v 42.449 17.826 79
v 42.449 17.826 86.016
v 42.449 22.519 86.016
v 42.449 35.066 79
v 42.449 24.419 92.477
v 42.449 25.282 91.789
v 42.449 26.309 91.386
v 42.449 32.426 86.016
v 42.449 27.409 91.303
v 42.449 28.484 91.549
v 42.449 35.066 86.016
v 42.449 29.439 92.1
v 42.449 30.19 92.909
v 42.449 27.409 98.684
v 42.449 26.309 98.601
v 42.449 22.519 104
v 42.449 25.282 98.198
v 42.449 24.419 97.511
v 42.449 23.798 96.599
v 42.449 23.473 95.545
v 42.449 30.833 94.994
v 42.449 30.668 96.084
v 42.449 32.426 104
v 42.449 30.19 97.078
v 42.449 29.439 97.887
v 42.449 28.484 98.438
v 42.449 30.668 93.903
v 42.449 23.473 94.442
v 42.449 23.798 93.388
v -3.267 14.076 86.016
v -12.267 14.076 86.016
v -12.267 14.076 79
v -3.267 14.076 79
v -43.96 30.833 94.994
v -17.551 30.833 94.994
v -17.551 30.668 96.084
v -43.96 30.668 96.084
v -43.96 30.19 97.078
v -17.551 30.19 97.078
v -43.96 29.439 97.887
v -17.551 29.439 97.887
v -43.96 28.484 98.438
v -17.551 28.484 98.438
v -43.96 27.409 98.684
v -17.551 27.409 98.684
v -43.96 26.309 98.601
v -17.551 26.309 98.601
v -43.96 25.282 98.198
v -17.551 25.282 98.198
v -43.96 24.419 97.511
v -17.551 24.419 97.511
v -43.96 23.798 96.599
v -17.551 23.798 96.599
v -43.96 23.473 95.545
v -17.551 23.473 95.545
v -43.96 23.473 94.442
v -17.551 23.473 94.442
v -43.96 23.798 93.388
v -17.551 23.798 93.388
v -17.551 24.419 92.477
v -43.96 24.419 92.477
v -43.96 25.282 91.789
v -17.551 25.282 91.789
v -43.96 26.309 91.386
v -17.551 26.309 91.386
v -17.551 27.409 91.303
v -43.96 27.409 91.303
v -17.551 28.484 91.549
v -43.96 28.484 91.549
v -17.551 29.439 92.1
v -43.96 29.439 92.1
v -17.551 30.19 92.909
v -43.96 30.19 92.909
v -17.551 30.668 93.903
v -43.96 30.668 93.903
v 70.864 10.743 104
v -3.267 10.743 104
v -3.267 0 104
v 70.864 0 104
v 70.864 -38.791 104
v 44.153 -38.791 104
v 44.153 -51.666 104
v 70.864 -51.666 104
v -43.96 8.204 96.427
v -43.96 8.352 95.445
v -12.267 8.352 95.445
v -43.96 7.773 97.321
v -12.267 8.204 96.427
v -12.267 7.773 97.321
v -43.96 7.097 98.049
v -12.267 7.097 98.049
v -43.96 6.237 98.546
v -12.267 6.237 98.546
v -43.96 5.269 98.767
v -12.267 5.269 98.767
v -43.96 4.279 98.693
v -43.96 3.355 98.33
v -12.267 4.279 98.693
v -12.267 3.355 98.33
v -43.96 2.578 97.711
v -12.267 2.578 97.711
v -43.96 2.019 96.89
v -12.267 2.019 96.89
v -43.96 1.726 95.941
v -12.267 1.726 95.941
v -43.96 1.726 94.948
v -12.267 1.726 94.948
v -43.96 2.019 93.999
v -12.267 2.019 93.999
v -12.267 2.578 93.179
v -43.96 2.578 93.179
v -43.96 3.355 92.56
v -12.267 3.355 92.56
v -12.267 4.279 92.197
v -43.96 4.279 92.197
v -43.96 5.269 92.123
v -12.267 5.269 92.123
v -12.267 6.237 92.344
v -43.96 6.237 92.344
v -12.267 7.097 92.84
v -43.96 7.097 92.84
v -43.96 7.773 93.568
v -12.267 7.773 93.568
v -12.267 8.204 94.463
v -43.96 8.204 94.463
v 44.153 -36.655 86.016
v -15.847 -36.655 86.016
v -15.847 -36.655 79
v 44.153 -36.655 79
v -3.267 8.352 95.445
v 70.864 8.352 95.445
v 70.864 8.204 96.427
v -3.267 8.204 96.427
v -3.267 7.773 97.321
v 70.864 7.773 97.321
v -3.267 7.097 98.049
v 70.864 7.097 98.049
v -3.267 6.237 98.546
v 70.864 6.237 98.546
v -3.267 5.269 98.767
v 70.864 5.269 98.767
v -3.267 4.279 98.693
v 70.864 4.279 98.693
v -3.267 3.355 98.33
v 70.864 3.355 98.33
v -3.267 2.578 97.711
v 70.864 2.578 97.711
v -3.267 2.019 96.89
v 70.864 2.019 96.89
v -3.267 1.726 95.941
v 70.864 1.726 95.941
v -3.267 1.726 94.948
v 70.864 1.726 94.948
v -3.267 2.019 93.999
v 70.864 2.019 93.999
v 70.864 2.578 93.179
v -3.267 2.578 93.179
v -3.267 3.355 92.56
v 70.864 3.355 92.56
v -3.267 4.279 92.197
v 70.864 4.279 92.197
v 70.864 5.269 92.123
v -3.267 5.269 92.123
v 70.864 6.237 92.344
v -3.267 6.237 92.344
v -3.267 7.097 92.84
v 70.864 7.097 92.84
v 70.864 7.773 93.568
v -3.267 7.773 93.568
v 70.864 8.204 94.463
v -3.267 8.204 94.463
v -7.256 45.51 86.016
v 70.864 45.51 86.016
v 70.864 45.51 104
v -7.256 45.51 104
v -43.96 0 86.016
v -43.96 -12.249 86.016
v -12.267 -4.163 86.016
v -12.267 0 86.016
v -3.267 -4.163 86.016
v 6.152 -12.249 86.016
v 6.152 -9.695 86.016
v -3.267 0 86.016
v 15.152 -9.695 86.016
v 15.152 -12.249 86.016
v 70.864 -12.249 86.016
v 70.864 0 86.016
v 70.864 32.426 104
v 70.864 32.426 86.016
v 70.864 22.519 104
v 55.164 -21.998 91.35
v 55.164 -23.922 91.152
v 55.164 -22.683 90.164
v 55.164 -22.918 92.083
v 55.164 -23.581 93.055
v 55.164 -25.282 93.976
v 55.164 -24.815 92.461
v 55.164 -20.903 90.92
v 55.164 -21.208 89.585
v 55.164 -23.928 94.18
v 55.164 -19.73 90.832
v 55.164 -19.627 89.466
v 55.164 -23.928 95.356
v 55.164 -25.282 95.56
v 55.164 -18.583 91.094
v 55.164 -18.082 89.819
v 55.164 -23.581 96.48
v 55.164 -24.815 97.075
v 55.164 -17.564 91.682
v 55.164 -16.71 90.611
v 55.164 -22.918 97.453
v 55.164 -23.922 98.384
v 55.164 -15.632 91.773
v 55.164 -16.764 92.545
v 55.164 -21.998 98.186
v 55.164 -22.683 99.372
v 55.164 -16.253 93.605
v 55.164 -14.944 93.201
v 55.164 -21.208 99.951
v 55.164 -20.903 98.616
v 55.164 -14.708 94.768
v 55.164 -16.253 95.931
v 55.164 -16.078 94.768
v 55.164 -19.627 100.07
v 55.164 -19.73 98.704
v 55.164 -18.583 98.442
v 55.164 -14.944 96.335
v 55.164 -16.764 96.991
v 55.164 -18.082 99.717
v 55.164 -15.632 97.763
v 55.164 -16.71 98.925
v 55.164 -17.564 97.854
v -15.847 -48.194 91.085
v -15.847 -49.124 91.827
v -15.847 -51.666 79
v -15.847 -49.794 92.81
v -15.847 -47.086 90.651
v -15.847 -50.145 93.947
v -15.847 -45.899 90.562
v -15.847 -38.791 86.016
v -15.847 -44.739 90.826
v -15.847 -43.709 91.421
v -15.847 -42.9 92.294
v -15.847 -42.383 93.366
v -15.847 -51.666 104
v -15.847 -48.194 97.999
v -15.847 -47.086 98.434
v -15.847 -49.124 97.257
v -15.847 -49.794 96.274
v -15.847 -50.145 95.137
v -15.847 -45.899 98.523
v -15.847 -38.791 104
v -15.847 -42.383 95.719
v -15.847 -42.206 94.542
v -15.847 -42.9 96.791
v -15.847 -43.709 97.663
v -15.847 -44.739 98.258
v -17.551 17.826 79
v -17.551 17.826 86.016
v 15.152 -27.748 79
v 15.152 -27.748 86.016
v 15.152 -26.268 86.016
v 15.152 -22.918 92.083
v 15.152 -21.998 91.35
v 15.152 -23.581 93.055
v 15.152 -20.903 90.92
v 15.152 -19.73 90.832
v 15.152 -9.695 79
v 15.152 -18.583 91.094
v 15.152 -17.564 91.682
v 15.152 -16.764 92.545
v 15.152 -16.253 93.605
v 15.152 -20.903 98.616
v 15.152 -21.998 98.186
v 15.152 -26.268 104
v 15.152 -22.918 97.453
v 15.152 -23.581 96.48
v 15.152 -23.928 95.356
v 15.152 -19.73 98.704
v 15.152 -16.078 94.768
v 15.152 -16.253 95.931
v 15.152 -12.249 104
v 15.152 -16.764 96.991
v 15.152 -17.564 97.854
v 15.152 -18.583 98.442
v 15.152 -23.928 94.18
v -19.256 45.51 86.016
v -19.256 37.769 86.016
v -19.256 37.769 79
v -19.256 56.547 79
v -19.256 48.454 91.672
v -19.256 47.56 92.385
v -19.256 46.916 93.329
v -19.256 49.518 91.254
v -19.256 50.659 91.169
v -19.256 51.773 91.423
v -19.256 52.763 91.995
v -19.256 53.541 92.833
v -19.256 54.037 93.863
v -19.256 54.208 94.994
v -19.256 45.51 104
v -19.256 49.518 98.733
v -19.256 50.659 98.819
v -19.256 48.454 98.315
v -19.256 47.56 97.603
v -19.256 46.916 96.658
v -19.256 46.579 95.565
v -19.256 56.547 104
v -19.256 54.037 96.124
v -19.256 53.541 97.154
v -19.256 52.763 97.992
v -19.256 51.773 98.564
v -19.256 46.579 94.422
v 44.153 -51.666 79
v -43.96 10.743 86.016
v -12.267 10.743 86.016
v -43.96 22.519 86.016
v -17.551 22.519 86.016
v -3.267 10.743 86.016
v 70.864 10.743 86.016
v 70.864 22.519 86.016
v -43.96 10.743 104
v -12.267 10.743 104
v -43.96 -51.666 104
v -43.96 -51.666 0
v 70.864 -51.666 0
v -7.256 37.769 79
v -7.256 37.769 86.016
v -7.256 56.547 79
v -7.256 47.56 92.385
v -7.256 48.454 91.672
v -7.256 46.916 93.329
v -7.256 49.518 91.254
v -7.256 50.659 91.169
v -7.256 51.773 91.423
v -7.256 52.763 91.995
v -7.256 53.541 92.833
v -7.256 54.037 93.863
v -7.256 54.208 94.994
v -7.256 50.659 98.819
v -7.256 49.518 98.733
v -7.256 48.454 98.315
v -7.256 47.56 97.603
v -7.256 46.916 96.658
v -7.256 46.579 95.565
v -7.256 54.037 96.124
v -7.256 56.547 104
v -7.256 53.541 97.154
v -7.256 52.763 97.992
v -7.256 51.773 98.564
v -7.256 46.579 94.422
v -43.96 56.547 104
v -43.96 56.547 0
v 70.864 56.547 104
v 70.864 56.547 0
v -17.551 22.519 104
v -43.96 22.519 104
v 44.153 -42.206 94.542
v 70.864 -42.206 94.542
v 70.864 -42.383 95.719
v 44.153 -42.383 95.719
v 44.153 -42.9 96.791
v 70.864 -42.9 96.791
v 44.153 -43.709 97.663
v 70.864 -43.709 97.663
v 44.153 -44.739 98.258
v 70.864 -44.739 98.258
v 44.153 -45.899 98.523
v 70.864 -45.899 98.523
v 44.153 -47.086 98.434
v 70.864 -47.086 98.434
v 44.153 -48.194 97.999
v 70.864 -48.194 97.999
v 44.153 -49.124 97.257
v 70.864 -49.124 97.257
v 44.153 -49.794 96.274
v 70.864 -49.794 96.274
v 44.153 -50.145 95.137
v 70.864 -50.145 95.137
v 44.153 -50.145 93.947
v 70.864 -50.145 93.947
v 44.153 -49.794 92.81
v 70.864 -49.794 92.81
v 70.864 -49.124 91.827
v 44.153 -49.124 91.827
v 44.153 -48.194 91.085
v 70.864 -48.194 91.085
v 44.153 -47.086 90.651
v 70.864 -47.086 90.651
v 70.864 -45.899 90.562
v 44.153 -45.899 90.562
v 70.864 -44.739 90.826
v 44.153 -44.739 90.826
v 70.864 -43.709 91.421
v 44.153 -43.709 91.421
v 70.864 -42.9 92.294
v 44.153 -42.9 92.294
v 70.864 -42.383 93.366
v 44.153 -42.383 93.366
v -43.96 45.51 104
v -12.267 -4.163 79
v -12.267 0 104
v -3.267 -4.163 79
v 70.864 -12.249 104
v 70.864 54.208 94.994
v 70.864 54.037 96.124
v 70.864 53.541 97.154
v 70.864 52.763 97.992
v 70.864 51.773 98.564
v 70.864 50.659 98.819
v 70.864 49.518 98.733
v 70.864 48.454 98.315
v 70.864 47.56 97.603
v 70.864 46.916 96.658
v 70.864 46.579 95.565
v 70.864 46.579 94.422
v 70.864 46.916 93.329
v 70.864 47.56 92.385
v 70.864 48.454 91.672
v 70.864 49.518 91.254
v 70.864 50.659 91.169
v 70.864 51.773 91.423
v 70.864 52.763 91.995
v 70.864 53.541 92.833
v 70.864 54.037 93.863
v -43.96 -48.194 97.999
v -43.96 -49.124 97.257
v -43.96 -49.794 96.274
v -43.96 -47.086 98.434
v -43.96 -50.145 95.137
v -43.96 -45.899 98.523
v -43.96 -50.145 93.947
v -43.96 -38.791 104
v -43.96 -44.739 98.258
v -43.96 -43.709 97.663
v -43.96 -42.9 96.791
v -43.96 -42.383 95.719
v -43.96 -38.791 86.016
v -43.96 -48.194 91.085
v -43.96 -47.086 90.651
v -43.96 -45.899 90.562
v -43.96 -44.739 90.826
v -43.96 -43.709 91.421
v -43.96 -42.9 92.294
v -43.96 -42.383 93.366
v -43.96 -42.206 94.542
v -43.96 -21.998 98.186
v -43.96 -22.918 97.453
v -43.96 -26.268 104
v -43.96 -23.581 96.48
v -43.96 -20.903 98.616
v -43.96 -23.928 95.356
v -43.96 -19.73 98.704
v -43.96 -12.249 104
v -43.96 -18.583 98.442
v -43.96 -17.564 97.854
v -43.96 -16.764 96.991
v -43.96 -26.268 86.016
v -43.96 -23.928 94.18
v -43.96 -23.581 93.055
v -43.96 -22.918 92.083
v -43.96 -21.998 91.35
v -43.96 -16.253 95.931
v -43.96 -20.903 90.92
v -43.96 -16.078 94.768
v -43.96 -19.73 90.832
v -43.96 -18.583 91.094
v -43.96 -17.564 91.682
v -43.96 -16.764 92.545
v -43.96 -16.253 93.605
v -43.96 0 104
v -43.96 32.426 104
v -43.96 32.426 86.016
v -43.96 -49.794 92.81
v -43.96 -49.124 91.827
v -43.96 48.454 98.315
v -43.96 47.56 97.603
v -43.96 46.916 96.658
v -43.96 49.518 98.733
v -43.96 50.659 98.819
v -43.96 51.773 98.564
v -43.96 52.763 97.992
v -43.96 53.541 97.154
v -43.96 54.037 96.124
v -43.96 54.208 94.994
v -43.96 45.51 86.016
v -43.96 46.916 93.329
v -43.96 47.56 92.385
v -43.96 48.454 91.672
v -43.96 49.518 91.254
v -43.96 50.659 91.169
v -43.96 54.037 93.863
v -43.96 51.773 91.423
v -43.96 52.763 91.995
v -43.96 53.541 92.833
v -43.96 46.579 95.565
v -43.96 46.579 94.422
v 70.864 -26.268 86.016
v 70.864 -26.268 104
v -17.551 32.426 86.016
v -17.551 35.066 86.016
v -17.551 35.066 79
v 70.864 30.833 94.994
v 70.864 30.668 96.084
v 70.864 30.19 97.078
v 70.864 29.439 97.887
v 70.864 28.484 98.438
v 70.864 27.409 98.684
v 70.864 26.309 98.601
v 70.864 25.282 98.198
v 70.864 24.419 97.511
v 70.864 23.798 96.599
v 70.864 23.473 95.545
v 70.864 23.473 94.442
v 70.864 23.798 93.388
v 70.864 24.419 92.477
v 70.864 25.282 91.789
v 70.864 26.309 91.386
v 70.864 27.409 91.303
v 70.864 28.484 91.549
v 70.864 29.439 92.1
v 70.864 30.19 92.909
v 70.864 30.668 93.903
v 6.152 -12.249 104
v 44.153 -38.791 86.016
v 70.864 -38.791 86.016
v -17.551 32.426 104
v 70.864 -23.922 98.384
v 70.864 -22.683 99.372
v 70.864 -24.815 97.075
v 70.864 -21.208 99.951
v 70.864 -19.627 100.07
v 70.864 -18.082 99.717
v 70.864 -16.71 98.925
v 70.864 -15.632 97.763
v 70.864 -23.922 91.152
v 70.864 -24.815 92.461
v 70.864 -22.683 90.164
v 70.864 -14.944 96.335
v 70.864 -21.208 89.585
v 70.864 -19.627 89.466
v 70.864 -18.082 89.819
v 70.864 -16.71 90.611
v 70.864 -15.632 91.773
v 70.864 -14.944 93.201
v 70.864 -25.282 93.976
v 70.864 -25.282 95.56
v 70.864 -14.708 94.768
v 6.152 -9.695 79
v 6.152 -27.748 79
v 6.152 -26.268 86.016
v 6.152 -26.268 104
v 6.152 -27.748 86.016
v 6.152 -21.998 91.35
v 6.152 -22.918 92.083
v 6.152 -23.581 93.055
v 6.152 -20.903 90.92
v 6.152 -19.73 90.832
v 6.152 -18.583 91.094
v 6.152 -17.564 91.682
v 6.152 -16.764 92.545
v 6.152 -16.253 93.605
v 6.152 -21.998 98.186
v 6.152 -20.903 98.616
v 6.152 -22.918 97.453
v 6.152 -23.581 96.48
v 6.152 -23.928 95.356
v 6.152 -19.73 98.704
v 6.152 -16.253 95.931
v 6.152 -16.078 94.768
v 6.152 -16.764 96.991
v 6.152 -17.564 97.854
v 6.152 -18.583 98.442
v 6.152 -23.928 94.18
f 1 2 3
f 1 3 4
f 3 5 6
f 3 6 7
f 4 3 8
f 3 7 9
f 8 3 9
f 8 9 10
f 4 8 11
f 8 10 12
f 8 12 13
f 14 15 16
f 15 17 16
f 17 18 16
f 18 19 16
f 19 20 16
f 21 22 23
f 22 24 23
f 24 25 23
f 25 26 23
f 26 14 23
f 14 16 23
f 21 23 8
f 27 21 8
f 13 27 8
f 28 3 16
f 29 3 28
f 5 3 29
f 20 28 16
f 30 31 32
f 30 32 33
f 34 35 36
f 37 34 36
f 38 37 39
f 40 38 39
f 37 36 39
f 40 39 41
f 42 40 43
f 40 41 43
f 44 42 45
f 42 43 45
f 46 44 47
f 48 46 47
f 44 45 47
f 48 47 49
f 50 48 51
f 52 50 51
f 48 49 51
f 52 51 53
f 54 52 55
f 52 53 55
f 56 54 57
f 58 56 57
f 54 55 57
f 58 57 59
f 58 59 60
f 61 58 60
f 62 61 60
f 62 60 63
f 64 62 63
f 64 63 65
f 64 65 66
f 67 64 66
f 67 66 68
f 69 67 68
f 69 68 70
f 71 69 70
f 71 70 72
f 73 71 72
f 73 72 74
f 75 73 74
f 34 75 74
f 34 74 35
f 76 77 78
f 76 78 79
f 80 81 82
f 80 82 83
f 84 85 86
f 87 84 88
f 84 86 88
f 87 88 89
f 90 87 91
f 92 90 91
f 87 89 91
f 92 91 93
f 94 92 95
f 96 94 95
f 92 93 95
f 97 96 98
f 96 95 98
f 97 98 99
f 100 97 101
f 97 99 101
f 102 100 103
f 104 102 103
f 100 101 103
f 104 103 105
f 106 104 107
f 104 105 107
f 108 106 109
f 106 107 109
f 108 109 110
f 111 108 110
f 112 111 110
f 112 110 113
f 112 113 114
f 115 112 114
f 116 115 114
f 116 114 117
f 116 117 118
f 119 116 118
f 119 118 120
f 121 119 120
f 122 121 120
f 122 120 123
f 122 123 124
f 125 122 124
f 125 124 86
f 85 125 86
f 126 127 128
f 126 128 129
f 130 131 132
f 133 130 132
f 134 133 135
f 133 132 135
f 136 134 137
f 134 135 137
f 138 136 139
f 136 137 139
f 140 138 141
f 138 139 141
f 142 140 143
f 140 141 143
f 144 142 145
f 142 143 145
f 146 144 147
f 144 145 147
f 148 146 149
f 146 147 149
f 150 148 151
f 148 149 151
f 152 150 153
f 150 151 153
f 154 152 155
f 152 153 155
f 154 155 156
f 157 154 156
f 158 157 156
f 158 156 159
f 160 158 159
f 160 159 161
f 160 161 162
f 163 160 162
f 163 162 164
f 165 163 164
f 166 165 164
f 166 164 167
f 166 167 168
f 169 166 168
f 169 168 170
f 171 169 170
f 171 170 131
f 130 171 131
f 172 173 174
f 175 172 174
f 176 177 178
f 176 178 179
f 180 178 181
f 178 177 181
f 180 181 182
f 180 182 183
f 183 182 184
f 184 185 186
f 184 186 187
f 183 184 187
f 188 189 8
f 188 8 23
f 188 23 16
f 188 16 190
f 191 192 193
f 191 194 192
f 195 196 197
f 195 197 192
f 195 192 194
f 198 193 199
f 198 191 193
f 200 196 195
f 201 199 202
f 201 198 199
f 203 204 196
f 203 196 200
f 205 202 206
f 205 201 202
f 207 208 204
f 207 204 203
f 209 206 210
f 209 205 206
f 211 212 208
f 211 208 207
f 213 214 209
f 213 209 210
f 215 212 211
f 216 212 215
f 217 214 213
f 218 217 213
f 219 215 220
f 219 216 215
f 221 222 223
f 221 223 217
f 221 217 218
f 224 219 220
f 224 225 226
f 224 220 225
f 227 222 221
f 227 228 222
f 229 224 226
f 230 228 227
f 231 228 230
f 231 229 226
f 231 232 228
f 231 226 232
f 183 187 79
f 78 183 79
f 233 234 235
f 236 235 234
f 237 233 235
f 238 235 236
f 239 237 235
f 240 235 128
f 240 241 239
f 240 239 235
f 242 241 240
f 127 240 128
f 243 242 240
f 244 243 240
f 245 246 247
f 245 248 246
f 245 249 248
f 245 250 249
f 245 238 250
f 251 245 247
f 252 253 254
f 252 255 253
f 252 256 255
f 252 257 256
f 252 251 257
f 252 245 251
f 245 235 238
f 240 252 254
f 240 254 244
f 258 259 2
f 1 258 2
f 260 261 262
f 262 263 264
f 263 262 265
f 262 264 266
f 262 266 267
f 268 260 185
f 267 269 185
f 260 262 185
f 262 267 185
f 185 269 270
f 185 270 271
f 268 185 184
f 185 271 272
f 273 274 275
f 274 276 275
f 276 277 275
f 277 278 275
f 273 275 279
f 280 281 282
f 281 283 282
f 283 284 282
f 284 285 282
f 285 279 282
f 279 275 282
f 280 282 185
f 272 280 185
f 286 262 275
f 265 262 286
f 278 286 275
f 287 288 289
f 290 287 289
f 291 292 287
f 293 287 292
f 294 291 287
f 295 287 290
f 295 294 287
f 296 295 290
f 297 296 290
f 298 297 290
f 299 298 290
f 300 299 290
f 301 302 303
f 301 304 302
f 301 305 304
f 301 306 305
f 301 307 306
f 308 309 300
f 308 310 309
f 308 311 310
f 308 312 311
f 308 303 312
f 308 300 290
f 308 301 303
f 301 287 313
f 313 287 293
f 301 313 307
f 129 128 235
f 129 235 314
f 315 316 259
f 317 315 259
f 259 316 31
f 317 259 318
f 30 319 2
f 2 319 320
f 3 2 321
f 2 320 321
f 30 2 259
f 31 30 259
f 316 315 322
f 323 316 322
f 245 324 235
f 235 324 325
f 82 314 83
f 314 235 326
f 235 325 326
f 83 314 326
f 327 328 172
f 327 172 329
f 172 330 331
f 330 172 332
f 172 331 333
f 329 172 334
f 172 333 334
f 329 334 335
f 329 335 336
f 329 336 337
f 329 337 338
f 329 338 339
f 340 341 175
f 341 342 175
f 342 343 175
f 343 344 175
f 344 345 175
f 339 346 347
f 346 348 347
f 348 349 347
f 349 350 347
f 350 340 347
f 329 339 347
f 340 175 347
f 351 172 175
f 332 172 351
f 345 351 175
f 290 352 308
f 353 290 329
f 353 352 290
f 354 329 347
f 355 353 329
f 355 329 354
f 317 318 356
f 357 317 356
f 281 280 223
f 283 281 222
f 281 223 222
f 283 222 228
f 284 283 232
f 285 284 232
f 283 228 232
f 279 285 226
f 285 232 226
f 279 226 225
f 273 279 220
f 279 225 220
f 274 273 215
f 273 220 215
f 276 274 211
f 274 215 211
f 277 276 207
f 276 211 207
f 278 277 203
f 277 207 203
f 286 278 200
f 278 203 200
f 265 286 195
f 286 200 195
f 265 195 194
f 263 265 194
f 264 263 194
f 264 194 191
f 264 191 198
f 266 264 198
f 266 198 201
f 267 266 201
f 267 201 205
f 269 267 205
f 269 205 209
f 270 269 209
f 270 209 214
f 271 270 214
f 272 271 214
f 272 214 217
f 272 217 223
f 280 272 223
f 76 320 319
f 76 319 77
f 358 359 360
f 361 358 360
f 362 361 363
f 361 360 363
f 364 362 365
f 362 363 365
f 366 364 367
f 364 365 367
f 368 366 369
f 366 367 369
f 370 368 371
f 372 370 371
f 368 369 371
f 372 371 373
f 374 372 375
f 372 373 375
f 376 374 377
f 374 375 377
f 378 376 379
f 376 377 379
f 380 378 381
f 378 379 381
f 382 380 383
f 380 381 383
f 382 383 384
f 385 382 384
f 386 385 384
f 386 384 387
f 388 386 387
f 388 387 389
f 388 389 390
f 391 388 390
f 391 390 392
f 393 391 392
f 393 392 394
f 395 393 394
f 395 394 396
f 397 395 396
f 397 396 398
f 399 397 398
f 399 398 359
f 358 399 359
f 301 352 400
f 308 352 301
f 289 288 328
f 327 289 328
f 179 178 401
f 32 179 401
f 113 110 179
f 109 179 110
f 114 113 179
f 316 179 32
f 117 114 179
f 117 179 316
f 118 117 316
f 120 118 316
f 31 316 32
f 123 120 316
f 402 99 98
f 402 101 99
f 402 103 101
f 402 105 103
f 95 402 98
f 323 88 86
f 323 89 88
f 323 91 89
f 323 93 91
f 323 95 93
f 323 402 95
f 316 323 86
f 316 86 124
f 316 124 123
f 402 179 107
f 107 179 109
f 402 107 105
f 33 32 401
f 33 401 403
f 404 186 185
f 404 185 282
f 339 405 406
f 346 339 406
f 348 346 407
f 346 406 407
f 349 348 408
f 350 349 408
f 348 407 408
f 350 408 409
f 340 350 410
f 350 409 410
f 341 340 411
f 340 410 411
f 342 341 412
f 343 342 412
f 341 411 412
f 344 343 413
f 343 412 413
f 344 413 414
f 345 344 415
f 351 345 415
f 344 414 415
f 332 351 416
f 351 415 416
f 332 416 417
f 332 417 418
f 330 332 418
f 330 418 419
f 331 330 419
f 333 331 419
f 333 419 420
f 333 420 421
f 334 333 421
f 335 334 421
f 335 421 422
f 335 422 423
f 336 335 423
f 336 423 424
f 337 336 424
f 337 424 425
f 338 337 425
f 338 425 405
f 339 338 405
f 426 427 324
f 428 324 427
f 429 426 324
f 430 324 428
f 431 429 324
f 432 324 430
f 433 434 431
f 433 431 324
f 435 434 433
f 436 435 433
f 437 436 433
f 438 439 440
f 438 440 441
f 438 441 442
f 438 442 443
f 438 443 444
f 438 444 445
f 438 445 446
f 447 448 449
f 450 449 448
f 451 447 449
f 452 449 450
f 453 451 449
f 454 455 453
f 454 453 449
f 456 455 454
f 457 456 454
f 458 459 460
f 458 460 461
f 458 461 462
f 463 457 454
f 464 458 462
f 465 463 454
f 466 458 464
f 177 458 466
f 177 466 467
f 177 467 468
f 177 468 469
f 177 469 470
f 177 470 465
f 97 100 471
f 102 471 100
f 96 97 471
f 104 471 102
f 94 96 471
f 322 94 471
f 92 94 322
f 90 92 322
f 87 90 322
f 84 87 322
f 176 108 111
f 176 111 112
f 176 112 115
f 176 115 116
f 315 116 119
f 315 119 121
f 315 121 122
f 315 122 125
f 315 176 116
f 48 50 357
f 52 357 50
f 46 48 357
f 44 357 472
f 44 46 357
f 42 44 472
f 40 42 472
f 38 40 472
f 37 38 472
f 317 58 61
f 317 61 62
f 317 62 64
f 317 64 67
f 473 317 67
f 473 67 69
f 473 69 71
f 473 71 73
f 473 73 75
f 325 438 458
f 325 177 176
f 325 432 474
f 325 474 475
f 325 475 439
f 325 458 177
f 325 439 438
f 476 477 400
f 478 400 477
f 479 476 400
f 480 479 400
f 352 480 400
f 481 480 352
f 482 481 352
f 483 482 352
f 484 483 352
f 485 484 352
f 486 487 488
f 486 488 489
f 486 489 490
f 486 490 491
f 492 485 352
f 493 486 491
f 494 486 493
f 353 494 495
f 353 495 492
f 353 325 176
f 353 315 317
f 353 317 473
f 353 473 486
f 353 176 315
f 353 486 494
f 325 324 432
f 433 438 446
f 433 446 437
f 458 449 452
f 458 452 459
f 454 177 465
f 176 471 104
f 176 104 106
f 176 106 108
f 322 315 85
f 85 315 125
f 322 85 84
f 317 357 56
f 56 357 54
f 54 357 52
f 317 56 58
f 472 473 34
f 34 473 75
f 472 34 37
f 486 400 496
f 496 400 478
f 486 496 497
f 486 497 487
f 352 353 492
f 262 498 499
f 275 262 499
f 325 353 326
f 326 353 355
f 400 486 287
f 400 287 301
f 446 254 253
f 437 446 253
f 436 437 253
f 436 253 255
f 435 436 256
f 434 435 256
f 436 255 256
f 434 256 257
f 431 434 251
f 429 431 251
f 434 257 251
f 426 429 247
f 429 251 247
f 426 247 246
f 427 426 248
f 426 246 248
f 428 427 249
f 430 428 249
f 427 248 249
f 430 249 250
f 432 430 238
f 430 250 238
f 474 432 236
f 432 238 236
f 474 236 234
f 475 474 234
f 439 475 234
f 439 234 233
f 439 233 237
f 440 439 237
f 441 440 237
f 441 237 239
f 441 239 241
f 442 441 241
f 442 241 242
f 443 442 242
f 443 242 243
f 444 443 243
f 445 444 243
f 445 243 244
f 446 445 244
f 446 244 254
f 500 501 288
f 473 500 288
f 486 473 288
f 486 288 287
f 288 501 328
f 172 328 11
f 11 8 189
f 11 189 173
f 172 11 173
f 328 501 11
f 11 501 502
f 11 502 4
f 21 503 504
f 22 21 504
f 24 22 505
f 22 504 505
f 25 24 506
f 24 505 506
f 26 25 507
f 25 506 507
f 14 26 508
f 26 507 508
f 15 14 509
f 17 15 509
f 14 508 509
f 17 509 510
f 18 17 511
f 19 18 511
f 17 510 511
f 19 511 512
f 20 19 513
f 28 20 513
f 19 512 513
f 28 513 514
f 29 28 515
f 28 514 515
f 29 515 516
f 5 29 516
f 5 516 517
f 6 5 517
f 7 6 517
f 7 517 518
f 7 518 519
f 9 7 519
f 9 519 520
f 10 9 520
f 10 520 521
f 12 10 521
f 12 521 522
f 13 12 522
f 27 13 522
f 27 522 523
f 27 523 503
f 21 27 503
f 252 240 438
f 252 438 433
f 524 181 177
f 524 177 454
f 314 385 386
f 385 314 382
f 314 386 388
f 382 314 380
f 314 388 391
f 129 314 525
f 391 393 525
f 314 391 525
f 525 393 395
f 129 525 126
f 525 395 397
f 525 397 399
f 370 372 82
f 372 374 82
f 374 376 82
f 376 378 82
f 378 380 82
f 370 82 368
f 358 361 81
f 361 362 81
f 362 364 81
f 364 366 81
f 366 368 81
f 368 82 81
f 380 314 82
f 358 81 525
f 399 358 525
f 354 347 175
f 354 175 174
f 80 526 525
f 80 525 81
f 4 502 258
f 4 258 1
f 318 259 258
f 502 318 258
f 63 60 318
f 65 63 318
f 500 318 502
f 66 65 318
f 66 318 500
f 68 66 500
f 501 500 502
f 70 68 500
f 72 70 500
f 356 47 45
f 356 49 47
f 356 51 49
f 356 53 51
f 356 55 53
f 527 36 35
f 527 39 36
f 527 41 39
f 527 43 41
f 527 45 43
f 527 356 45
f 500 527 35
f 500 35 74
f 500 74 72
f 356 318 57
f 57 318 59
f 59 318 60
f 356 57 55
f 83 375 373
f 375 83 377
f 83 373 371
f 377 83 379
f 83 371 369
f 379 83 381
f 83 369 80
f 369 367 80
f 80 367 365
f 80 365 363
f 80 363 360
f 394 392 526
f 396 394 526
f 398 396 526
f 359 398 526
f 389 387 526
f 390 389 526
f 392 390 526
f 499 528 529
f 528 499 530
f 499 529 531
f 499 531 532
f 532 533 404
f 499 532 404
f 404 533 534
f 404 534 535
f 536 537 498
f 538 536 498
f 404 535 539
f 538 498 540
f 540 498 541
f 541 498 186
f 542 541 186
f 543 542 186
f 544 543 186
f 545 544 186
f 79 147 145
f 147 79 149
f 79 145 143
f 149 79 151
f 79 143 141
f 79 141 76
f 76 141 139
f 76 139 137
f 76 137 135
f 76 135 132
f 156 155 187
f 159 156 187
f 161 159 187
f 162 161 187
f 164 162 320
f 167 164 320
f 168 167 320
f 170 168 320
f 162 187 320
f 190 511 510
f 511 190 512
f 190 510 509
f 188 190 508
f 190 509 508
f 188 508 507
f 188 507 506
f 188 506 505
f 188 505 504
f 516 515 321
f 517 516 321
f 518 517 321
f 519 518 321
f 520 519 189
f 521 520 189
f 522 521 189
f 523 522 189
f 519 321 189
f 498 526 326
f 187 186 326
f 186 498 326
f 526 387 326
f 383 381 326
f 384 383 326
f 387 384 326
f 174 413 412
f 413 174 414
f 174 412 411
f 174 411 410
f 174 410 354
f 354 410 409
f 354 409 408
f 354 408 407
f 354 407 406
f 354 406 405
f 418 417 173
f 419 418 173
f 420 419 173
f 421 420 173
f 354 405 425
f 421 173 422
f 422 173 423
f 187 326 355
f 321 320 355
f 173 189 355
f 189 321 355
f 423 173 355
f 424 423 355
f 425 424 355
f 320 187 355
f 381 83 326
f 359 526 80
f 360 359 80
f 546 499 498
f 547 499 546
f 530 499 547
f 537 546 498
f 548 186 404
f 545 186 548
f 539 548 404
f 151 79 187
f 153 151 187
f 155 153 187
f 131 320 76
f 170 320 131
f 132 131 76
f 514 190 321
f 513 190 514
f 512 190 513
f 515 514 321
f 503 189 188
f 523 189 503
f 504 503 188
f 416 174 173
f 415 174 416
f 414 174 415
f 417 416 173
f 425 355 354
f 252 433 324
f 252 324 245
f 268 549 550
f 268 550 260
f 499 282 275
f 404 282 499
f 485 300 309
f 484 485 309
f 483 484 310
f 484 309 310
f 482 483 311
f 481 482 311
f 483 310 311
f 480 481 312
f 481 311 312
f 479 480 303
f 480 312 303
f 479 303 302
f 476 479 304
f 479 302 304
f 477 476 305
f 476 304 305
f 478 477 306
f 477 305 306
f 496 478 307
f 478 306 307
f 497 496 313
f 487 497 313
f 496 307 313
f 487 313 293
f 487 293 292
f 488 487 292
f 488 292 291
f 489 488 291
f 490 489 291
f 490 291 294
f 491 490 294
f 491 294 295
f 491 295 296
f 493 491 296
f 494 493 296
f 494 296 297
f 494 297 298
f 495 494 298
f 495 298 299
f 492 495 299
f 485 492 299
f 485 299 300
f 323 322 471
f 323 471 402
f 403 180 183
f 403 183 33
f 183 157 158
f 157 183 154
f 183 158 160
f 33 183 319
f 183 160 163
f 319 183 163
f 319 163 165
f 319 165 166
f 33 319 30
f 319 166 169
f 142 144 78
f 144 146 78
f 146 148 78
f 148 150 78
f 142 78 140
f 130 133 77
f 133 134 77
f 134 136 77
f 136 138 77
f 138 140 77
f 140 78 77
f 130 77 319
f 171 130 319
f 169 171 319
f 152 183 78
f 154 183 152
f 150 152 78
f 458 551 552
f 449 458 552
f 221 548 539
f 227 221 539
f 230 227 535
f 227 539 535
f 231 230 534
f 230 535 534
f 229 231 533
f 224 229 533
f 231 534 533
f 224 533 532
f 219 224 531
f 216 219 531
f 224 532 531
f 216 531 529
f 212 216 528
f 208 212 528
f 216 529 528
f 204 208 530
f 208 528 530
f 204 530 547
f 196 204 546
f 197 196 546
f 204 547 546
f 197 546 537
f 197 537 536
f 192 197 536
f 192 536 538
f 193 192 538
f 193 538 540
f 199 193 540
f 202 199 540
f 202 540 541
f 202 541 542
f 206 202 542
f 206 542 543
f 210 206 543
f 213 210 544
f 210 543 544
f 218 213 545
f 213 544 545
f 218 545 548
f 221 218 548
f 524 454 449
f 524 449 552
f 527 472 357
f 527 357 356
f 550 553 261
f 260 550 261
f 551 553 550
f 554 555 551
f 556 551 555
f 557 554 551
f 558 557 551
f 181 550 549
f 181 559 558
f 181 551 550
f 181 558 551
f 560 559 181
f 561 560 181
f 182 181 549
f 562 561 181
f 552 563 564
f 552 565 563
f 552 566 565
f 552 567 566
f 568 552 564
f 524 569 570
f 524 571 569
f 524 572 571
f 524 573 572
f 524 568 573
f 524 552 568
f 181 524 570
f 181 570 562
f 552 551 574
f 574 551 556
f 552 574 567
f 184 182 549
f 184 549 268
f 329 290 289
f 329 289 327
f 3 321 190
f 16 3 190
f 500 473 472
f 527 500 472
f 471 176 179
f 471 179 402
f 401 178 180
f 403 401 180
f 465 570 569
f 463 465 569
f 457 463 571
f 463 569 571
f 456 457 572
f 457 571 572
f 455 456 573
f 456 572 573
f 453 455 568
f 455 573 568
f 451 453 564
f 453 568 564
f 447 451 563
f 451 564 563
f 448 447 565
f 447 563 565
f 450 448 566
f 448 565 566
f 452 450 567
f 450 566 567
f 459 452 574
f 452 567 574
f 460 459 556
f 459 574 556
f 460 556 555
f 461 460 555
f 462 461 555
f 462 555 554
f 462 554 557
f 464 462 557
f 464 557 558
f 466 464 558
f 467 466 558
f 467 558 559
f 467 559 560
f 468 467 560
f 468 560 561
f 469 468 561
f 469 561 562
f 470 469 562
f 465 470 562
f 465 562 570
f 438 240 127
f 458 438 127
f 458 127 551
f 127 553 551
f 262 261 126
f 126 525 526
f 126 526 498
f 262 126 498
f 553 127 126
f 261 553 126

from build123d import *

# Parameters (mm, degrees)
F0_W     = 114.8236654699
F0_H     = 108.2134023309
F1_DEPTH = 104
F2_W     = 12.52374053
F2_H     = 20.7482948899
F2_W_2   = 12.2485402972
F2_H_2   = 20.5613672733
F2_W_3   = 11.7760580033
F2_W_4   = 13.0845084786
F3_DEPTH = 114.8246654699
F4_W     = 60
F4_H     = 17.0350422454
F4_W_2   = 9
F4_H_2   = 18.0536039271
F4_H_3   = 18.2386368836
F4_H_4   = 17.2398763835
F4_W_3   = 12
F4_H_5   = 23.2148324465
F5_DEPTH = 25
F6_R     = 3.9918066597
F6_R_2   = 3.9469258839
F6_R_3   = 3.3313946803
F6_R_4   = 3.8357142578
F6_R_5   = 3.700614932
F7_DEPTH = 114.8246654699
F8_R     = 5.3166490127
F9_DEPTH = 15.7


with BuildPart() as f1:
    # F0 (on Top) → F1 (new body)
    with BuildSketch(Plane.XY):
        with Locations((13.4518984705, 2.4405606091)):
            Rectangle(F0_W, F0_H)
    extrude(amount=F1_DEPTH)

    # F2 (on face) → F3 (cut, through all)
    with BuildSketch(Plane.YZ.offset(70.8637312055)):
        with Locations((-32.5295254588, 96.3900126517)):
            Rectangle(F2_W, F2_H)
        with Locations((-6.1242701486, 96.2965488434)):
            Rectangle(F2_W_2, F2_H_2)
        with Locations((16.6308367625, 96.3900126517)):
            Rectangle(F2_W_3, F2_H)
        with Locations((38.9679595828, 96.2965488434)):
            Rectangle(F2_W_4, F2_H_2)
    extrude(amount=-F3_DEPTH, mode=Mode.SUBTRACT)

    # F4 (on face) → F5 (cut)
    with BuildSketch(Plane.XY.offset(104)):
        with Locations((14.153456504, -45.1724111309)):
            Rectangle(F4_W, F4_H)
        with Locations((10.6519766077, -18.7213037212)):
            Rectangle(F4_W_2, F4_H_2)
        with Locations((-7.7669977982, 4.9567892806)):
            Rectangle(F4_W_2, F4_H_3)
        with Locations((12.4489111735, 26.4460458092)):
            Rectangle(F4_W, F4_H_4)
        with Locations((-13.255634157, 49.3767052152)):
            Rectangle(F4_W_3, F4_H_5)
    extrude(amount=-F5_DEPTH, mode=Mode.SUBTRACT)

    # F6 (on face) → F7 (cut, through all)
    with BuildSketch(Plane.YZ.offset(70.8637312055)):
        with Locations((-46.1977943778, 94.5423319936)):
            Circle(F6_R)
        with Locations((-20.0246851891, 94.7679579258)):
            Circle(F6_R_2)
        with Locations((5.0202719867, 95.4448506236)):
            Circle(F6_R_3)
        with Locations((50.3719523549, 94.9935913086)):
            Circle(F6_R_4)
        with Locations((27.132038027, 94.9935913086)):
            Circle(F6_R_5)
    extrude(amount=-F7_DEPTH, mode=Mode.SUBTRACT)

    # F8 (on face) → F9 (cut)
    with BuildSketch(Plane.YZ.offset(70.8637312055)):
        with Locations((-20.0246851891, 94.7679579258)):
            Circle(F8_R)
    extrude(amount=-F9_DEPTH, mode=Mode.SUBTRACT)


solid = f1.part
